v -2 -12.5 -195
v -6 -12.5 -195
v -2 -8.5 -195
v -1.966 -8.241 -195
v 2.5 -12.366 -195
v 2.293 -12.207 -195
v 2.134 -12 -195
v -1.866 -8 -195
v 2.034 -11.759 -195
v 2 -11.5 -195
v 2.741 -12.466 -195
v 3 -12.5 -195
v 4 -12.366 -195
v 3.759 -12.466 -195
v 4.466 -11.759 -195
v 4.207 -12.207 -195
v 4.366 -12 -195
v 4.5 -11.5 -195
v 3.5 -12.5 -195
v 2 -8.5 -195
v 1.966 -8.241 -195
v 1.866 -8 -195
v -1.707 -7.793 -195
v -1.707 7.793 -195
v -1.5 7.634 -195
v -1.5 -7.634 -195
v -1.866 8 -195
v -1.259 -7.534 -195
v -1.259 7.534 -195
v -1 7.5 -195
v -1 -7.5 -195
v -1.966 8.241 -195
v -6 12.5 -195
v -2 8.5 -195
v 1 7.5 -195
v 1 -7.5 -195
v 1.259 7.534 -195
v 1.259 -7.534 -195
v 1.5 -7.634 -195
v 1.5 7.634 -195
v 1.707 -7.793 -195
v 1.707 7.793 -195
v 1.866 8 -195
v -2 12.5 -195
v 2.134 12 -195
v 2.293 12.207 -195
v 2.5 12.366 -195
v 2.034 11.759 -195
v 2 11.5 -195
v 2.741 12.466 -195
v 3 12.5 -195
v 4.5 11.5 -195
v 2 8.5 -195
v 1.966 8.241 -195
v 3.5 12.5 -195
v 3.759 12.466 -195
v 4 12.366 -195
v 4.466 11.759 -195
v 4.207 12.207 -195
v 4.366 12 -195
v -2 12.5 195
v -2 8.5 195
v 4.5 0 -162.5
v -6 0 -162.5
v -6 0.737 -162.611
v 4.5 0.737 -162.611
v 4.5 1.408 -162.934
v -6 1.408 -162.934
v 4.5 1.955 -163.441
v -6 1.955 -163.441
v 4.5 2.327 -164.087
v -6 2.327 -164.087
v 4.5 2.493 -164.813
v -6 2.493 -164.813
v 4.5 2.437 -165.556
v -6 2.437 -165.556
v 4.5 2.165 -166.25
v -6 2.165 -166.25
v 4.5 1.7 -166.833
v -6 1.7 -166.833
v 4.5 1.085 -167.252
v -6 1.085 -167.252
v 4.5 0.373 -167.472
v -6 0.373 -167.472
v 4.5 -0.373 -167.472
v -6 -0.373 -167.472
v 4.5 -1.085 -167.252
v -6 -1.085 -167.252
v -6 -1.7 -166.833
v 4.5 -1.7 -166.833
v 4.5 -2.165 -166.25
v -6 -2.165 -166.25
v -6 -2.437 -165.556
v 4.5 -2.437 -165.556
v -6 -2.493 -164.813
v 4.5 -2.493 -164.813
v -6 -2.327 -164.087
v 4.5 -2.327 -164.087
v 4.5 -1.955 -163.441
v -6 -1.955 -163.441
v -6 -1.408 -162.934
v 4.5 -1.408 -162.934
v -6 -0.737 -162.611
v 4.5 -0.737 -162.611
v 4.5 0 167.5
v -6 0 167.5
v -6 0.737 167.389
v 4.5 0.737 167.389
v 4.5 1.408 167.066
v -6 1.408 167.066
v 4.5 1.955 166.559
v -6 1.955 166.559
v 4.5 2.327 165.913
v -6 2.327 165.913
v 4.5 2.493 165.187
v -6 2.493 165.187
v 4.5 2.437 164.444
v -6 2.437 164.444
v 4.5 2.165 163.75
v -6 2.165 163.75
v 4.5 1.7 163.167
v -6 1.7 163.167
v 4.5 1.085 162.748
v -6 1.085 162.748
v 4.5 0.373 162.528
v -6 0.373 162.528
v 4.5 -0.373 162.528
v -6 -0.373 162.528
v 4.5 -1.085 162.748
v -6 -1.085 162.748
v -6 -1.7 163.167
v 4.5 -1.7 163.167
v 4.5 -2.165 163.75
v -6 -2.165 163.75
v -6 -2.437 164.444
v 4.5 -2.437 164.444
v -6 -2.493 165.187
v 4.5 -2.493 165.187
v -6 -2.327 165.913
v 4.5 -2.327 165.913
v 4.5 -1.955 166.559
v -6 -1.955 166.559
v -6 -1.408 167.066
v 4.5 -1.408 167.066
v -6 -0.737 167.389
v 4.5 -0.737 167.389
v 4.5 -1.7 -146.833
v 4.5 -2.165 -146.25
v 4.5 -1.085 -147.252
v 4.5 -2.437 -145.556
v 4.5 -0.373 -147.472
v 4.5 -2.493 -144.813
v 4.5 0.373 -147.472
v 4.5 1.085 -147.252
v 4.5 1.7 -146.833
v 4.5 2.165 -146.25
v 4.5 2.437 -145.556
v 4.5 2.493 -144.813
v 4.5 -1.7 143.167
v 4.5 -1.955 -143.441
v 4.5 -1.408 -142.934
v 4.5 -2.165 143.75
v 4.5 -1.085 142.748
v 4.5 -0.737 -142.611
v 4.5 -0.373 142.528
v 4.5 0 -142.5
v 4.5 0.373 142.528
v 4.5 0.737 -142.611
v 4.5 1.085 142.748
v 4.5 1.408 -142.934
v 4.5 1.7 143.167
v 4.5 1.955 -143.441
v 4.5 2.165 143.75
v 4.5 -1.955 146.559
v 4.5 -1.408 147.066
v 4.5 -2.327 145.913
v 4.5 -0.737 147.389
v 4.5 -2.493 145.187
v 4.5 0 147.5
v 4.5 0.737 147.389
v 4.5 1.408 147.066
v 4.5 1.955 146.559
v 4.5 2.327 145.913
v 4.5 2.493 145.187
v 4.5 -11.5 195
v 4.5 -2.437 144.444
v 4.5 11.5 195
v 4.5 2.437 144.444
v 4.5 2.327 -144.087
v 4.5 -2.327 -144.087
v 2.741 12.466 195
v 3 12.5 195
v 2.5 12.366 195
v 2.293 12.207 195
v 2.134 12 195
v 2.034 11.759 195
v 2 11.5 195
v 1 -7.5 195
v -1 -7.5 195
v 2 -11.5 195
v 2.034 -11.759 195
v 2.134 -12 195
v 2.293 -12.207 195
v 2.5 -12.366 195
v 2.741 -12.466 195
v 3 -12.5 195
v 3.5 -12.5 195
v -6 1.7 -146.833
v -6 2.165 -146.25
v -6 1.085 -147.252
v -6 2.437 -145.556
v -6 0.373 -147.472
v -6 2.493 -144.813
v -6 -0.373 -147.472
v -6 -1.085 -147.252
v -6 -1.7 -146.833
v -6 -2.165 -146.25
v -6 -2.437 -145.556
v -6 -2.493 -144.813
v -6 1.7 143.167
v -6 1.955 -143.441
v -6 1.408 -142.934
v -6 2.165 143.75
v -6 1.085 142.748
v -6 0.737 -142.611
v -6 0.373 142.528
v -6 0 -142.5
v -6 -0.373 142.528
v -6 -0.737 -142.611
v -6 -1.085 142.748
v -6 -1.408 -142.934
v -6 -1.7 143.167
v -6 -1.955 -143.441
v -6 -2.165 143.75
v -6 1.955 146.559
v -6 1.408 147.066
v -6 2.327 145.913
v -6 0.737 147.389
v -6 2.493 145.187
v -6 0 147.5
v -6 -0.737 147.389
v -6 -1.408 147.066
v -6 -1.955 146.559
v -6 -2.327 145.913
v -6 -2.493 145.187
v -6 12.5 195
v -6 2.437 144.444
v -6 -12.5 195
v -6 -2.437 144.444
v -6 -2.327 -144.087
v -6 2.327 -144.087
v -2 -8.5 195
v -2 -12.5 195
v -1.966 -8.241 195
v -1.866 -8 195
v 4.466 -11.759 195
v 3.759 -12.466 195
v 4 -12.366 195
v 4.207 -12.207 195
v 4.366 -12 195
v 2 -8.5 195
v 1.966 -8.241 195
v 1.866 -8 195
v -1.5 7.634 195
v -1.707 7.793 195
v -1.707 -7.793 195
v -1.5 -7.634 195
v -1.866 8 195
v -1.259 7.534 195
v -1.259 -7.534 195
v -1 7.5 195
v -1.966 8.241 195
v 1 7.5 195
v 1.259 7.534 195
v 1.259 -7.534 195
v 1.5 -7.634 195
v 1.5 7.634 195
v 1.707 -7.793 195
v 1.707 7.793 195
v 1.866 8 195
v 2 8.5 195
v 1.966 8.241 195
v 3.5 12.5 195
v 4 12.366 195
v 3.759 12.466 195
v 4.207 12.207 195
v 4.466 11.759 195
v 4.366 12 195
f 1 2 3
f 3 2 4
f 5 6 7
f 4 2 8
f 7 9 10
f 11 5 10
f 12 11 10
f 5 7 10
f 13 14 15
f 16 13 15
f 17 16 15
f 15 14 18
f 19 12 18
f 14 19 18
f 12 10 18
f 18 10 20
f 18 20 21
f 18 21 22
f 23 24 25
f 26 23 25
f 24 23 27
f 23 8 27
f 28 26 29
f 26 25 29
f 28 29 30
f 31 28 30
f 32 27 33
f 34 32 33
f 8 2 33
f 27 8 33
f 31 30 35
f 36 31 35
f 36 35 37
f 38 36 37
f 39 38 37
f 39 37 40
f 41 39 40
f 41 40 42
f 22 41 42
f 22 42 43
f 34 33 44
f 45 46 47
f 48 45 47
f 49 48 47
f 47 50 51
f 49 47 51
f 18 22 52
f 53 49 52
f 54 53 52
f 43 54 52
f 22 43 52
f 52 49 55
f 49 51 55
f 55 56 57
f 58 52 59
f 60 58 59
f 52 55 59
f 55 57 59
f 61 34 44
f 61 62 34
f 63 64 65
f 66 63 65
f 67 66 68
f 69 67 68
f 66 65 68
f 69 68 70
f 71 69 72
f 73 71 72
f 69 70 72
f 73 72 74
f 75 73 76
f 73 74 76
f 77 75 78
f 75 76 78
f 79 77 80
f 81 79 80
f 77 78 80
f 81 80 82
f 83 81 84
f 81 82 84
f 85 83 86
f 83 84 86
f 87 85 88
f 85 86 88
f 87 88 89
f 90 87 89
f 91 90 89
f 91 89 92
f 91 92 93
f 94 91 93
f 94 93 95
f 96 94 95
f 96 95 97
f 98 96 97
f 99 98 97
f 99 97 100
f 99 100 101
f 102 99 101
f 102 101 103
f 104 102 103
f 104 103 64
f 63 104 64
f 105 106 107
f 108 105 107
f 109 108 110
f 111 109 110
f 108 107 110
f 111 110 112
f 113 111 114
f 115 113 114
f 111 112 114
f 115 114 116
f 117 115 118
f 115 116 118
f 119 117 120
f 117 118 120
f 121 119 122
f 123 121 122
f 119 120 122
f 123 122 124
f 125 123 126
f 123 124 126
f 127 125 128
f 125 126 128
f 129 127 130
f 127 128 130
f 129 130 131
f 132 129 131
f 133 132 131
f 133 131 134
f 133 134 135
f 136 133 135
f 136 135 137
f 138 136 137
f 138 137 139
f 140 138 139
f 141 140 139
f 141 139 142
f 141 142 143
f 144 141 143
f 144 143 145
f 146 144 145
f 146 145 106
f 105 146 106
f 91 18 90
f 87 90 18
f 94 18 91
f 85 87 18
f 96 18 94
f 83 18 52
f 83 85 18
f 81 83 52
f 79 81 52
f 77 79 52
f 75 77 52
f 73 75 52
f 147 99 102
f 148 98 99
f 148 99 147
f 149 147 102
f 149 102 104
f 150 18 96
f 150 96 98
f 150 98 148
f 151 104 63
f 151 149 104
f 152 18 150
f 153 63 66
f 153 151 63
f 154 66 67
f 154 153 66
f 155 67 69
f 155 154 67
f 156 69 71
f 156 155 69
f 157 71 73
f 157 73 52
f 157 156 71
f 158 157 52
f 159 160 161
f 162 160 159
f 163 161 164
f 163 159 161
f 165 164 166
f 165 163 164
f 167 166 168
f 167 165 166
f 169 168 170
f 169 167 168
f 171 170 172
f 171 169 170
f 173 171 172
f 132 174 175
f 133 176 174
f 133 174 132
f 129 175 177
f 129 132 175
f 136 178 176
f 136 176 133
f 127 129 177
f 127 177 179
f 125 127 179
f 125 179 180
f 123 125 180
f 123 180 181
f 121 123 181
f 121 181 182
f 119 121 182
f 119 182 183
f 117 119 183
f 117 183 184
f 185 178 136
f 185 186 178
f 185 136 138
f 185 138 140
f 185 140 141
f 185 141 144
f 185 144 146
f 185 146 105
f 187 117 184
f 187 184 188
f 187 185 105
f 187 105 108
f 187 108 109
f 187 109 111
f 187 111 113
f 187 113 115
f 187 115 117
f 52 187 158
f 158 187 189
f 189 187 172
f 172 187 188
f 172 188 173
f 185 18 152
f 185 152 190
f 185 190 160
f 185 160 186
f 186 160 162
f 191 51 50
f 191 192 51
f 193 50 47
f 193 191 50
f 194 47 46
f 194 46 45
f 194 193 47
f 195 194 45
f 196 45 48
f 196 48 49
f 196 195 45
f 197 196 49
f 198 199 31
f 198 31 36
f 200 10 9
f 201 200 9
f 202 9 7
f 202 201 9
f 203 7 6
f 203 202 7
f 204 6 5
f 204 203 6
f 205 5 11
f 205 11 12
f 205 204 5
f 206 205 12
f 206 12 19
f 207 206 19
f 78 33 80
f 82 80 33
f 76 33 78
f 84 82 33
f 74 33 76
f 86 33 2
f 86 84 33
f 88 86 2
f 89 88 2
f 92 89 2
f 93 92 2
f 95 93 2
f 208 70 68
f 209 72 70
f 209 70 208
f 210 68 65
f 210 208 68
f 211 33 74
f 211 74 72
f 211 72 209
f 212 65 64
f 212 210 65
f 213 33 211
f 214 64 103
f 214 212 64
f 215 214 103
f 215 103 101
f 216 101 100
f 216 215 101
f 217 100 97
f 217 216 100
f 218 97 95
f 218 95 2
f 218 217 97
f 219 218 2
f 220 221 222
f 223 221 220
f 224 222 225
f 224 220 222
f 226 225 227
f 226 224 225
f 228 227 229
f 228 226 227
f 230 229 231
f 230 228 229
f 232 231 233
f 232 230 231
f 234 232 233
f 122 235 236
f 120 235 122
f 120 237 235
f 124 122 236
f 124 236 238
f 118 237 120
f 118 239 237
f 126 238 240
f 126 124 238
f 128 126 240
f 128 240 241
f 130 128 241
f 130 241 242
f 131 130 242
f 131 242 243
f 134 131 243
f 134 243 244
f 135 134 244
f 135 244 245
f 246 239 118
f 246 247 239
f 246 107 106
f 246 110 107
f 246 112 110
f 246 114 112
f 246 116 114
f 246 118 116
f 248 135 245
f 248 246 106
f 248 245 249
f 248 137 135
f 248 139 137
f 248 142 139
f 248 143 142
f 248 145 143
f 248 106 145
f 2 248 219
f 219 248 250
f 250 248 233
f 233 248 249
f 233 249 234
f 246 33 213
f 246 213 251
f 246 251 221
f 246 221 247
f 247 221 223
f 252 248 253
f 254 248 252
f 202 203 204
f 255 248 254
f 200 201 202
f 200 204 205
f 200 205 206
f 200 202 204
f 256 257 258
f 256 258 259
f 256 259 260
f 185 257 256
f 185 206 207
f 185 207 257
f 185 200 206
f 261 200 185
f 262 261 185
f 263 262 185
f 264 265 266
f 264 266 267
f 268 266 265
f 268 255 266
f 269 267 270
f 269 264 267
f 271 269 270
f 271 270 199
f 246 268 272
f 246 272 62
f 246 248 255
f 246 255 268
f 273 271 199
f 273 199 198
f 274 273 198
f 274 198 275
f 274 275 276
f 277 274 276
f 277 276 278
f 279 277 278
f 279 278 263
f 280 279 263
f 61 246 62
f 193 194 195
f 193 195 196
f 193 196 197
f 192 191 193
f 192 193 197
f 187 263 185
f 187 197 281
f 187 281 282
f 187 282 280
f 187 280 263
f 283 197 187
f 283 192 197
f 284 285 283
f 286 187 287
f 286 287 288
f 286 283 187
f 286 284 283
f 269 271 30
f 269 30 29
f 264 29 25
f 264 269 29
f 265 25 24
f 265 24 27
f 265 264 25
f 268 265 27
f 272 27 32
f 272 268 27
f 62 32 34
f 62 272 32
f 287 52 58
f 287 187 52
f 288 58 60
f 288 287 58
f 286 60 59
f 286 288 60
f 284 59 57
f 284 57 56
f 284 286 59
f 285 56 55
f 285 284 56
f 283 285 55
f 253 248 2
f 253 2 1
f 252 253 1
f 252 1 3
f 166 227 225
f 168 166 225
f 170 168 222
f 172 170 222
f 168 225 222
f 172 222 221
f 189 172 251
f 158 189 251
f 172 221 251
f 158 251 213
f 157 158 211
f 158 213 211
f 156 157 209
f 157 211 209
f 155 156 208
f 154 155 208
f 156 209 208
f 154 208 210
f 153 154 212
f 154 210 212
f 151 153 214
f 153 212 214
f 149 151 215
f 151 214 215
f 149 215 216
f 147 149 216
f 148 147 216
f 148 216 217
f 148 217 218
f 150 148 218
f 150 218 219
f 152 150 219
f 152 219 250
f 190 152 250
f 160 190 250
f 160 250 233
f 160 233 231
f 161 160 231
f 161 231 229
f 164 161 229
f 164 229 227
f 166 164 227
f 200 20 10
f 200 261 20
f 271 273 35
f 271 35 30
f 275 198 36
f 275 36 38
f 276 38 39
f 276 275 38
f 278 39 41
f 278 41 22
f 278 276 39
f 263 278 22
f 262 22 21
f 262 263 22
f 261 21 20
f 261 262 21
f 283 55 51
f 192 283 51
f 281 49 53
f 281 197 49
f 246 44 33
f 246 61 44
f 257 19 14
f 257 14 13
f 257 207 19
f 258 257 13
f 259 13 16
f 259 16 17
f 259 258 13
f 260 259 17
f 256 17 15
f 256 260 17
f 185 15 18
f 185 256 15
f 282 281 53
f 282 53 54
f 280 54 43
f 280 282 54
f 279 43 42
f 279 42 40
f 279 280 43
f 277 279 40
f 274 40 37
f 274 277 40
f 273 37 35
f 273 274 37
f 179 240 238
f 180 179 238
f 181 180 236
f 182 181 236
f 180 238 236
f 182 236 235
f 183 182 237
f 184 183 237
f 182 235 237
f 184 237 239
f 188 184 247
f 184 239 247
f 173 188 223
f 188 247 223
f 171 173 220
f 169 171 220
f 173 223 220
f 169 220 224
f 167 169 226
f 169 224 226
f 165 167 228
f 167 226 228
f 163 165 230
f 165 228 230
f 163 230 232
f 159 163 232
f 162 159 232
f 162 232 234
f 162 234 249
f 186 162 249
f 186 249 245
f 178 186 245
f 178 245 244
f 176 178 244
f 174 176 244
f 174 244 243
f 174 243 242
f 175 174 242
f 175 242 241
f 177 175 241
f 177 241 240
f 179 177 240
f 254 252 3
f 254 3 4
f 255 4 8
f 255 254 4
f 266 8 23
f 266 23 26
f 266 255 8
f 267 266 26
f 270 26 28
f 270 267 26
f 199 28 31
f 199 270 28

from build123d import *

# Parameters (mm, degrees)
BOSS_EXTRUDE1_DEPTH = 195
CUT_EXTRUDE1_REACH  = 197.682
SKETCH4_R           = 2.5
FILLET1_R           = 1


with BuildPart() as part:
    # Sketch3 → Boss-Extrude1 (new, symmetric)
    with BuildSketch(Plane.XY):
        with BuildLine():
            Line((-6, 12.5), (-6, -12.5))
            Line((-6, -12.5), (-2, -12.5))
            Line((-2, -12.5), (-2, -8.5))
            ThreePointArc((-2, -8.5), (-1.707106781, -7.792893219), (-1, -7.5))
            Line((-1, -7.5), (1, -7.5))
            ThreePointArc((1, -7.5), (1.707106781, -7.792893219), (2, -8.5))
            Line((2, -8.5), (2, -12.5))
            Line((2, -12.5), (4.5, -12.5))
            Line((4.5, -12.5), (4.5, 12.5))
            Line((4.5, 12.5), (2, 12.5))
            Line((2, 12.5), (2, 8.5))
            ThreePointArc((2, 8.5), (1.707106781, 7.792893219), (1, 7.5))
            Line((1, 7.5), (-1, 7.5))
            ThreePointArc((-1, 7.5), (-1.707106781, 7.792893219), (-2, 8.5))
            Line((-2, 8.5), (-2, 12.5))
            Line((-2, 12.5), (-6, 12.5))
        make_face()
    extrude(amount=BOSS_EXTRUDE1_DEPTH, both=True)

    # Sketch4 → Cut-Extrude1 (cut, up to next)
    with BuildSketch(Plane.ZY.offset(6), mode=Mode.PRIVATE) as cut_extrude1_sk1:
        with Locations((-165, 0)):
            Circle(SKETCH4_R)
    cut_extrude1_tool1 = extrude(cut_extrude1_sk1.sketch, amount=-CUT_EXTRUDE1_REACH, mode=Mode.PRIVATE) & part.part
    # Sketch4 → Cut-Extrude1 (cut, up to next)
    with BuildSketch(Plane.ZY.offset(6), mode=Mode.PRIVATE) as cut_extrude1_sk2:
        with Locations((-145, 0)):
            Circle(SKETCH4_R)
    cut_extrude1_tool2 = extrude(cut_extrude1_sk2.sketch, amount=-CUT_EXTRUDE1_REACH, mode=Mode.PRIVATE) & part.part
    # Sketch4 → Cut-Extrude1 (cut, up to next)
    with BuildSketch(Plane.ZY.offset(6), mode=Mode.PRIVATE) as cut_extrude1_sk3:
        with Locations((165, 0)):
            Circle(SKETCH4_R)
    cut_extrude1_tool3 = extrude(cut_extrude1_sk3.sketch, amount=-CUT_EXTRUDE1_REACH, mode=Mode.PRIVATE) & part.part
    # Sketch4 → Cut-Extrude1 (cut, up to next)
    with BuildSketch(Plane.ZY.offset(6), mode=Mode.PRIVATE) as cut_extrude1_sk4:
        with Locations((145, 0)):
            Circle(SKETCH4_R)
    cut_extrude1_tool4 = extrude(cut_extrude1_sk4.sketch, amount=-CUT_EXTRUDE1_REACH, mode=Mode.PRIVATE) & part.part
    add(cut_extrude1_tool1.solids().sort_by_distance((-6, 0, -165))[0], mode=Mode.SUBTRACT)
    add(cut_extrude1_tool2.solids().sort_by_distance((-6, 0, -145))[0], mode=Mode.SUBTRACT)
    add(cut_extrude1_tool3.solids().sort_by_distance((-6, 0, 165))[0], mode=Mode.SUBTRACT)
    add(cut_extrude1_tool4.solids().sort_by_distance((-6, 0, 145))[0], mode=Mode.SUBTRACT)

    # Fillet1
    fillet1_edges = [part.edges().sort_by_distance(p)[0] for p in [
        (2, 12.5, 0),
        (4.5, 12.5, 0),
        (4.5, -12.5, 0),
        (2, -12.5, 0),
    ]]
    fillet(fillet1_edges, radius=FILLET1_R)


solid = part.part
